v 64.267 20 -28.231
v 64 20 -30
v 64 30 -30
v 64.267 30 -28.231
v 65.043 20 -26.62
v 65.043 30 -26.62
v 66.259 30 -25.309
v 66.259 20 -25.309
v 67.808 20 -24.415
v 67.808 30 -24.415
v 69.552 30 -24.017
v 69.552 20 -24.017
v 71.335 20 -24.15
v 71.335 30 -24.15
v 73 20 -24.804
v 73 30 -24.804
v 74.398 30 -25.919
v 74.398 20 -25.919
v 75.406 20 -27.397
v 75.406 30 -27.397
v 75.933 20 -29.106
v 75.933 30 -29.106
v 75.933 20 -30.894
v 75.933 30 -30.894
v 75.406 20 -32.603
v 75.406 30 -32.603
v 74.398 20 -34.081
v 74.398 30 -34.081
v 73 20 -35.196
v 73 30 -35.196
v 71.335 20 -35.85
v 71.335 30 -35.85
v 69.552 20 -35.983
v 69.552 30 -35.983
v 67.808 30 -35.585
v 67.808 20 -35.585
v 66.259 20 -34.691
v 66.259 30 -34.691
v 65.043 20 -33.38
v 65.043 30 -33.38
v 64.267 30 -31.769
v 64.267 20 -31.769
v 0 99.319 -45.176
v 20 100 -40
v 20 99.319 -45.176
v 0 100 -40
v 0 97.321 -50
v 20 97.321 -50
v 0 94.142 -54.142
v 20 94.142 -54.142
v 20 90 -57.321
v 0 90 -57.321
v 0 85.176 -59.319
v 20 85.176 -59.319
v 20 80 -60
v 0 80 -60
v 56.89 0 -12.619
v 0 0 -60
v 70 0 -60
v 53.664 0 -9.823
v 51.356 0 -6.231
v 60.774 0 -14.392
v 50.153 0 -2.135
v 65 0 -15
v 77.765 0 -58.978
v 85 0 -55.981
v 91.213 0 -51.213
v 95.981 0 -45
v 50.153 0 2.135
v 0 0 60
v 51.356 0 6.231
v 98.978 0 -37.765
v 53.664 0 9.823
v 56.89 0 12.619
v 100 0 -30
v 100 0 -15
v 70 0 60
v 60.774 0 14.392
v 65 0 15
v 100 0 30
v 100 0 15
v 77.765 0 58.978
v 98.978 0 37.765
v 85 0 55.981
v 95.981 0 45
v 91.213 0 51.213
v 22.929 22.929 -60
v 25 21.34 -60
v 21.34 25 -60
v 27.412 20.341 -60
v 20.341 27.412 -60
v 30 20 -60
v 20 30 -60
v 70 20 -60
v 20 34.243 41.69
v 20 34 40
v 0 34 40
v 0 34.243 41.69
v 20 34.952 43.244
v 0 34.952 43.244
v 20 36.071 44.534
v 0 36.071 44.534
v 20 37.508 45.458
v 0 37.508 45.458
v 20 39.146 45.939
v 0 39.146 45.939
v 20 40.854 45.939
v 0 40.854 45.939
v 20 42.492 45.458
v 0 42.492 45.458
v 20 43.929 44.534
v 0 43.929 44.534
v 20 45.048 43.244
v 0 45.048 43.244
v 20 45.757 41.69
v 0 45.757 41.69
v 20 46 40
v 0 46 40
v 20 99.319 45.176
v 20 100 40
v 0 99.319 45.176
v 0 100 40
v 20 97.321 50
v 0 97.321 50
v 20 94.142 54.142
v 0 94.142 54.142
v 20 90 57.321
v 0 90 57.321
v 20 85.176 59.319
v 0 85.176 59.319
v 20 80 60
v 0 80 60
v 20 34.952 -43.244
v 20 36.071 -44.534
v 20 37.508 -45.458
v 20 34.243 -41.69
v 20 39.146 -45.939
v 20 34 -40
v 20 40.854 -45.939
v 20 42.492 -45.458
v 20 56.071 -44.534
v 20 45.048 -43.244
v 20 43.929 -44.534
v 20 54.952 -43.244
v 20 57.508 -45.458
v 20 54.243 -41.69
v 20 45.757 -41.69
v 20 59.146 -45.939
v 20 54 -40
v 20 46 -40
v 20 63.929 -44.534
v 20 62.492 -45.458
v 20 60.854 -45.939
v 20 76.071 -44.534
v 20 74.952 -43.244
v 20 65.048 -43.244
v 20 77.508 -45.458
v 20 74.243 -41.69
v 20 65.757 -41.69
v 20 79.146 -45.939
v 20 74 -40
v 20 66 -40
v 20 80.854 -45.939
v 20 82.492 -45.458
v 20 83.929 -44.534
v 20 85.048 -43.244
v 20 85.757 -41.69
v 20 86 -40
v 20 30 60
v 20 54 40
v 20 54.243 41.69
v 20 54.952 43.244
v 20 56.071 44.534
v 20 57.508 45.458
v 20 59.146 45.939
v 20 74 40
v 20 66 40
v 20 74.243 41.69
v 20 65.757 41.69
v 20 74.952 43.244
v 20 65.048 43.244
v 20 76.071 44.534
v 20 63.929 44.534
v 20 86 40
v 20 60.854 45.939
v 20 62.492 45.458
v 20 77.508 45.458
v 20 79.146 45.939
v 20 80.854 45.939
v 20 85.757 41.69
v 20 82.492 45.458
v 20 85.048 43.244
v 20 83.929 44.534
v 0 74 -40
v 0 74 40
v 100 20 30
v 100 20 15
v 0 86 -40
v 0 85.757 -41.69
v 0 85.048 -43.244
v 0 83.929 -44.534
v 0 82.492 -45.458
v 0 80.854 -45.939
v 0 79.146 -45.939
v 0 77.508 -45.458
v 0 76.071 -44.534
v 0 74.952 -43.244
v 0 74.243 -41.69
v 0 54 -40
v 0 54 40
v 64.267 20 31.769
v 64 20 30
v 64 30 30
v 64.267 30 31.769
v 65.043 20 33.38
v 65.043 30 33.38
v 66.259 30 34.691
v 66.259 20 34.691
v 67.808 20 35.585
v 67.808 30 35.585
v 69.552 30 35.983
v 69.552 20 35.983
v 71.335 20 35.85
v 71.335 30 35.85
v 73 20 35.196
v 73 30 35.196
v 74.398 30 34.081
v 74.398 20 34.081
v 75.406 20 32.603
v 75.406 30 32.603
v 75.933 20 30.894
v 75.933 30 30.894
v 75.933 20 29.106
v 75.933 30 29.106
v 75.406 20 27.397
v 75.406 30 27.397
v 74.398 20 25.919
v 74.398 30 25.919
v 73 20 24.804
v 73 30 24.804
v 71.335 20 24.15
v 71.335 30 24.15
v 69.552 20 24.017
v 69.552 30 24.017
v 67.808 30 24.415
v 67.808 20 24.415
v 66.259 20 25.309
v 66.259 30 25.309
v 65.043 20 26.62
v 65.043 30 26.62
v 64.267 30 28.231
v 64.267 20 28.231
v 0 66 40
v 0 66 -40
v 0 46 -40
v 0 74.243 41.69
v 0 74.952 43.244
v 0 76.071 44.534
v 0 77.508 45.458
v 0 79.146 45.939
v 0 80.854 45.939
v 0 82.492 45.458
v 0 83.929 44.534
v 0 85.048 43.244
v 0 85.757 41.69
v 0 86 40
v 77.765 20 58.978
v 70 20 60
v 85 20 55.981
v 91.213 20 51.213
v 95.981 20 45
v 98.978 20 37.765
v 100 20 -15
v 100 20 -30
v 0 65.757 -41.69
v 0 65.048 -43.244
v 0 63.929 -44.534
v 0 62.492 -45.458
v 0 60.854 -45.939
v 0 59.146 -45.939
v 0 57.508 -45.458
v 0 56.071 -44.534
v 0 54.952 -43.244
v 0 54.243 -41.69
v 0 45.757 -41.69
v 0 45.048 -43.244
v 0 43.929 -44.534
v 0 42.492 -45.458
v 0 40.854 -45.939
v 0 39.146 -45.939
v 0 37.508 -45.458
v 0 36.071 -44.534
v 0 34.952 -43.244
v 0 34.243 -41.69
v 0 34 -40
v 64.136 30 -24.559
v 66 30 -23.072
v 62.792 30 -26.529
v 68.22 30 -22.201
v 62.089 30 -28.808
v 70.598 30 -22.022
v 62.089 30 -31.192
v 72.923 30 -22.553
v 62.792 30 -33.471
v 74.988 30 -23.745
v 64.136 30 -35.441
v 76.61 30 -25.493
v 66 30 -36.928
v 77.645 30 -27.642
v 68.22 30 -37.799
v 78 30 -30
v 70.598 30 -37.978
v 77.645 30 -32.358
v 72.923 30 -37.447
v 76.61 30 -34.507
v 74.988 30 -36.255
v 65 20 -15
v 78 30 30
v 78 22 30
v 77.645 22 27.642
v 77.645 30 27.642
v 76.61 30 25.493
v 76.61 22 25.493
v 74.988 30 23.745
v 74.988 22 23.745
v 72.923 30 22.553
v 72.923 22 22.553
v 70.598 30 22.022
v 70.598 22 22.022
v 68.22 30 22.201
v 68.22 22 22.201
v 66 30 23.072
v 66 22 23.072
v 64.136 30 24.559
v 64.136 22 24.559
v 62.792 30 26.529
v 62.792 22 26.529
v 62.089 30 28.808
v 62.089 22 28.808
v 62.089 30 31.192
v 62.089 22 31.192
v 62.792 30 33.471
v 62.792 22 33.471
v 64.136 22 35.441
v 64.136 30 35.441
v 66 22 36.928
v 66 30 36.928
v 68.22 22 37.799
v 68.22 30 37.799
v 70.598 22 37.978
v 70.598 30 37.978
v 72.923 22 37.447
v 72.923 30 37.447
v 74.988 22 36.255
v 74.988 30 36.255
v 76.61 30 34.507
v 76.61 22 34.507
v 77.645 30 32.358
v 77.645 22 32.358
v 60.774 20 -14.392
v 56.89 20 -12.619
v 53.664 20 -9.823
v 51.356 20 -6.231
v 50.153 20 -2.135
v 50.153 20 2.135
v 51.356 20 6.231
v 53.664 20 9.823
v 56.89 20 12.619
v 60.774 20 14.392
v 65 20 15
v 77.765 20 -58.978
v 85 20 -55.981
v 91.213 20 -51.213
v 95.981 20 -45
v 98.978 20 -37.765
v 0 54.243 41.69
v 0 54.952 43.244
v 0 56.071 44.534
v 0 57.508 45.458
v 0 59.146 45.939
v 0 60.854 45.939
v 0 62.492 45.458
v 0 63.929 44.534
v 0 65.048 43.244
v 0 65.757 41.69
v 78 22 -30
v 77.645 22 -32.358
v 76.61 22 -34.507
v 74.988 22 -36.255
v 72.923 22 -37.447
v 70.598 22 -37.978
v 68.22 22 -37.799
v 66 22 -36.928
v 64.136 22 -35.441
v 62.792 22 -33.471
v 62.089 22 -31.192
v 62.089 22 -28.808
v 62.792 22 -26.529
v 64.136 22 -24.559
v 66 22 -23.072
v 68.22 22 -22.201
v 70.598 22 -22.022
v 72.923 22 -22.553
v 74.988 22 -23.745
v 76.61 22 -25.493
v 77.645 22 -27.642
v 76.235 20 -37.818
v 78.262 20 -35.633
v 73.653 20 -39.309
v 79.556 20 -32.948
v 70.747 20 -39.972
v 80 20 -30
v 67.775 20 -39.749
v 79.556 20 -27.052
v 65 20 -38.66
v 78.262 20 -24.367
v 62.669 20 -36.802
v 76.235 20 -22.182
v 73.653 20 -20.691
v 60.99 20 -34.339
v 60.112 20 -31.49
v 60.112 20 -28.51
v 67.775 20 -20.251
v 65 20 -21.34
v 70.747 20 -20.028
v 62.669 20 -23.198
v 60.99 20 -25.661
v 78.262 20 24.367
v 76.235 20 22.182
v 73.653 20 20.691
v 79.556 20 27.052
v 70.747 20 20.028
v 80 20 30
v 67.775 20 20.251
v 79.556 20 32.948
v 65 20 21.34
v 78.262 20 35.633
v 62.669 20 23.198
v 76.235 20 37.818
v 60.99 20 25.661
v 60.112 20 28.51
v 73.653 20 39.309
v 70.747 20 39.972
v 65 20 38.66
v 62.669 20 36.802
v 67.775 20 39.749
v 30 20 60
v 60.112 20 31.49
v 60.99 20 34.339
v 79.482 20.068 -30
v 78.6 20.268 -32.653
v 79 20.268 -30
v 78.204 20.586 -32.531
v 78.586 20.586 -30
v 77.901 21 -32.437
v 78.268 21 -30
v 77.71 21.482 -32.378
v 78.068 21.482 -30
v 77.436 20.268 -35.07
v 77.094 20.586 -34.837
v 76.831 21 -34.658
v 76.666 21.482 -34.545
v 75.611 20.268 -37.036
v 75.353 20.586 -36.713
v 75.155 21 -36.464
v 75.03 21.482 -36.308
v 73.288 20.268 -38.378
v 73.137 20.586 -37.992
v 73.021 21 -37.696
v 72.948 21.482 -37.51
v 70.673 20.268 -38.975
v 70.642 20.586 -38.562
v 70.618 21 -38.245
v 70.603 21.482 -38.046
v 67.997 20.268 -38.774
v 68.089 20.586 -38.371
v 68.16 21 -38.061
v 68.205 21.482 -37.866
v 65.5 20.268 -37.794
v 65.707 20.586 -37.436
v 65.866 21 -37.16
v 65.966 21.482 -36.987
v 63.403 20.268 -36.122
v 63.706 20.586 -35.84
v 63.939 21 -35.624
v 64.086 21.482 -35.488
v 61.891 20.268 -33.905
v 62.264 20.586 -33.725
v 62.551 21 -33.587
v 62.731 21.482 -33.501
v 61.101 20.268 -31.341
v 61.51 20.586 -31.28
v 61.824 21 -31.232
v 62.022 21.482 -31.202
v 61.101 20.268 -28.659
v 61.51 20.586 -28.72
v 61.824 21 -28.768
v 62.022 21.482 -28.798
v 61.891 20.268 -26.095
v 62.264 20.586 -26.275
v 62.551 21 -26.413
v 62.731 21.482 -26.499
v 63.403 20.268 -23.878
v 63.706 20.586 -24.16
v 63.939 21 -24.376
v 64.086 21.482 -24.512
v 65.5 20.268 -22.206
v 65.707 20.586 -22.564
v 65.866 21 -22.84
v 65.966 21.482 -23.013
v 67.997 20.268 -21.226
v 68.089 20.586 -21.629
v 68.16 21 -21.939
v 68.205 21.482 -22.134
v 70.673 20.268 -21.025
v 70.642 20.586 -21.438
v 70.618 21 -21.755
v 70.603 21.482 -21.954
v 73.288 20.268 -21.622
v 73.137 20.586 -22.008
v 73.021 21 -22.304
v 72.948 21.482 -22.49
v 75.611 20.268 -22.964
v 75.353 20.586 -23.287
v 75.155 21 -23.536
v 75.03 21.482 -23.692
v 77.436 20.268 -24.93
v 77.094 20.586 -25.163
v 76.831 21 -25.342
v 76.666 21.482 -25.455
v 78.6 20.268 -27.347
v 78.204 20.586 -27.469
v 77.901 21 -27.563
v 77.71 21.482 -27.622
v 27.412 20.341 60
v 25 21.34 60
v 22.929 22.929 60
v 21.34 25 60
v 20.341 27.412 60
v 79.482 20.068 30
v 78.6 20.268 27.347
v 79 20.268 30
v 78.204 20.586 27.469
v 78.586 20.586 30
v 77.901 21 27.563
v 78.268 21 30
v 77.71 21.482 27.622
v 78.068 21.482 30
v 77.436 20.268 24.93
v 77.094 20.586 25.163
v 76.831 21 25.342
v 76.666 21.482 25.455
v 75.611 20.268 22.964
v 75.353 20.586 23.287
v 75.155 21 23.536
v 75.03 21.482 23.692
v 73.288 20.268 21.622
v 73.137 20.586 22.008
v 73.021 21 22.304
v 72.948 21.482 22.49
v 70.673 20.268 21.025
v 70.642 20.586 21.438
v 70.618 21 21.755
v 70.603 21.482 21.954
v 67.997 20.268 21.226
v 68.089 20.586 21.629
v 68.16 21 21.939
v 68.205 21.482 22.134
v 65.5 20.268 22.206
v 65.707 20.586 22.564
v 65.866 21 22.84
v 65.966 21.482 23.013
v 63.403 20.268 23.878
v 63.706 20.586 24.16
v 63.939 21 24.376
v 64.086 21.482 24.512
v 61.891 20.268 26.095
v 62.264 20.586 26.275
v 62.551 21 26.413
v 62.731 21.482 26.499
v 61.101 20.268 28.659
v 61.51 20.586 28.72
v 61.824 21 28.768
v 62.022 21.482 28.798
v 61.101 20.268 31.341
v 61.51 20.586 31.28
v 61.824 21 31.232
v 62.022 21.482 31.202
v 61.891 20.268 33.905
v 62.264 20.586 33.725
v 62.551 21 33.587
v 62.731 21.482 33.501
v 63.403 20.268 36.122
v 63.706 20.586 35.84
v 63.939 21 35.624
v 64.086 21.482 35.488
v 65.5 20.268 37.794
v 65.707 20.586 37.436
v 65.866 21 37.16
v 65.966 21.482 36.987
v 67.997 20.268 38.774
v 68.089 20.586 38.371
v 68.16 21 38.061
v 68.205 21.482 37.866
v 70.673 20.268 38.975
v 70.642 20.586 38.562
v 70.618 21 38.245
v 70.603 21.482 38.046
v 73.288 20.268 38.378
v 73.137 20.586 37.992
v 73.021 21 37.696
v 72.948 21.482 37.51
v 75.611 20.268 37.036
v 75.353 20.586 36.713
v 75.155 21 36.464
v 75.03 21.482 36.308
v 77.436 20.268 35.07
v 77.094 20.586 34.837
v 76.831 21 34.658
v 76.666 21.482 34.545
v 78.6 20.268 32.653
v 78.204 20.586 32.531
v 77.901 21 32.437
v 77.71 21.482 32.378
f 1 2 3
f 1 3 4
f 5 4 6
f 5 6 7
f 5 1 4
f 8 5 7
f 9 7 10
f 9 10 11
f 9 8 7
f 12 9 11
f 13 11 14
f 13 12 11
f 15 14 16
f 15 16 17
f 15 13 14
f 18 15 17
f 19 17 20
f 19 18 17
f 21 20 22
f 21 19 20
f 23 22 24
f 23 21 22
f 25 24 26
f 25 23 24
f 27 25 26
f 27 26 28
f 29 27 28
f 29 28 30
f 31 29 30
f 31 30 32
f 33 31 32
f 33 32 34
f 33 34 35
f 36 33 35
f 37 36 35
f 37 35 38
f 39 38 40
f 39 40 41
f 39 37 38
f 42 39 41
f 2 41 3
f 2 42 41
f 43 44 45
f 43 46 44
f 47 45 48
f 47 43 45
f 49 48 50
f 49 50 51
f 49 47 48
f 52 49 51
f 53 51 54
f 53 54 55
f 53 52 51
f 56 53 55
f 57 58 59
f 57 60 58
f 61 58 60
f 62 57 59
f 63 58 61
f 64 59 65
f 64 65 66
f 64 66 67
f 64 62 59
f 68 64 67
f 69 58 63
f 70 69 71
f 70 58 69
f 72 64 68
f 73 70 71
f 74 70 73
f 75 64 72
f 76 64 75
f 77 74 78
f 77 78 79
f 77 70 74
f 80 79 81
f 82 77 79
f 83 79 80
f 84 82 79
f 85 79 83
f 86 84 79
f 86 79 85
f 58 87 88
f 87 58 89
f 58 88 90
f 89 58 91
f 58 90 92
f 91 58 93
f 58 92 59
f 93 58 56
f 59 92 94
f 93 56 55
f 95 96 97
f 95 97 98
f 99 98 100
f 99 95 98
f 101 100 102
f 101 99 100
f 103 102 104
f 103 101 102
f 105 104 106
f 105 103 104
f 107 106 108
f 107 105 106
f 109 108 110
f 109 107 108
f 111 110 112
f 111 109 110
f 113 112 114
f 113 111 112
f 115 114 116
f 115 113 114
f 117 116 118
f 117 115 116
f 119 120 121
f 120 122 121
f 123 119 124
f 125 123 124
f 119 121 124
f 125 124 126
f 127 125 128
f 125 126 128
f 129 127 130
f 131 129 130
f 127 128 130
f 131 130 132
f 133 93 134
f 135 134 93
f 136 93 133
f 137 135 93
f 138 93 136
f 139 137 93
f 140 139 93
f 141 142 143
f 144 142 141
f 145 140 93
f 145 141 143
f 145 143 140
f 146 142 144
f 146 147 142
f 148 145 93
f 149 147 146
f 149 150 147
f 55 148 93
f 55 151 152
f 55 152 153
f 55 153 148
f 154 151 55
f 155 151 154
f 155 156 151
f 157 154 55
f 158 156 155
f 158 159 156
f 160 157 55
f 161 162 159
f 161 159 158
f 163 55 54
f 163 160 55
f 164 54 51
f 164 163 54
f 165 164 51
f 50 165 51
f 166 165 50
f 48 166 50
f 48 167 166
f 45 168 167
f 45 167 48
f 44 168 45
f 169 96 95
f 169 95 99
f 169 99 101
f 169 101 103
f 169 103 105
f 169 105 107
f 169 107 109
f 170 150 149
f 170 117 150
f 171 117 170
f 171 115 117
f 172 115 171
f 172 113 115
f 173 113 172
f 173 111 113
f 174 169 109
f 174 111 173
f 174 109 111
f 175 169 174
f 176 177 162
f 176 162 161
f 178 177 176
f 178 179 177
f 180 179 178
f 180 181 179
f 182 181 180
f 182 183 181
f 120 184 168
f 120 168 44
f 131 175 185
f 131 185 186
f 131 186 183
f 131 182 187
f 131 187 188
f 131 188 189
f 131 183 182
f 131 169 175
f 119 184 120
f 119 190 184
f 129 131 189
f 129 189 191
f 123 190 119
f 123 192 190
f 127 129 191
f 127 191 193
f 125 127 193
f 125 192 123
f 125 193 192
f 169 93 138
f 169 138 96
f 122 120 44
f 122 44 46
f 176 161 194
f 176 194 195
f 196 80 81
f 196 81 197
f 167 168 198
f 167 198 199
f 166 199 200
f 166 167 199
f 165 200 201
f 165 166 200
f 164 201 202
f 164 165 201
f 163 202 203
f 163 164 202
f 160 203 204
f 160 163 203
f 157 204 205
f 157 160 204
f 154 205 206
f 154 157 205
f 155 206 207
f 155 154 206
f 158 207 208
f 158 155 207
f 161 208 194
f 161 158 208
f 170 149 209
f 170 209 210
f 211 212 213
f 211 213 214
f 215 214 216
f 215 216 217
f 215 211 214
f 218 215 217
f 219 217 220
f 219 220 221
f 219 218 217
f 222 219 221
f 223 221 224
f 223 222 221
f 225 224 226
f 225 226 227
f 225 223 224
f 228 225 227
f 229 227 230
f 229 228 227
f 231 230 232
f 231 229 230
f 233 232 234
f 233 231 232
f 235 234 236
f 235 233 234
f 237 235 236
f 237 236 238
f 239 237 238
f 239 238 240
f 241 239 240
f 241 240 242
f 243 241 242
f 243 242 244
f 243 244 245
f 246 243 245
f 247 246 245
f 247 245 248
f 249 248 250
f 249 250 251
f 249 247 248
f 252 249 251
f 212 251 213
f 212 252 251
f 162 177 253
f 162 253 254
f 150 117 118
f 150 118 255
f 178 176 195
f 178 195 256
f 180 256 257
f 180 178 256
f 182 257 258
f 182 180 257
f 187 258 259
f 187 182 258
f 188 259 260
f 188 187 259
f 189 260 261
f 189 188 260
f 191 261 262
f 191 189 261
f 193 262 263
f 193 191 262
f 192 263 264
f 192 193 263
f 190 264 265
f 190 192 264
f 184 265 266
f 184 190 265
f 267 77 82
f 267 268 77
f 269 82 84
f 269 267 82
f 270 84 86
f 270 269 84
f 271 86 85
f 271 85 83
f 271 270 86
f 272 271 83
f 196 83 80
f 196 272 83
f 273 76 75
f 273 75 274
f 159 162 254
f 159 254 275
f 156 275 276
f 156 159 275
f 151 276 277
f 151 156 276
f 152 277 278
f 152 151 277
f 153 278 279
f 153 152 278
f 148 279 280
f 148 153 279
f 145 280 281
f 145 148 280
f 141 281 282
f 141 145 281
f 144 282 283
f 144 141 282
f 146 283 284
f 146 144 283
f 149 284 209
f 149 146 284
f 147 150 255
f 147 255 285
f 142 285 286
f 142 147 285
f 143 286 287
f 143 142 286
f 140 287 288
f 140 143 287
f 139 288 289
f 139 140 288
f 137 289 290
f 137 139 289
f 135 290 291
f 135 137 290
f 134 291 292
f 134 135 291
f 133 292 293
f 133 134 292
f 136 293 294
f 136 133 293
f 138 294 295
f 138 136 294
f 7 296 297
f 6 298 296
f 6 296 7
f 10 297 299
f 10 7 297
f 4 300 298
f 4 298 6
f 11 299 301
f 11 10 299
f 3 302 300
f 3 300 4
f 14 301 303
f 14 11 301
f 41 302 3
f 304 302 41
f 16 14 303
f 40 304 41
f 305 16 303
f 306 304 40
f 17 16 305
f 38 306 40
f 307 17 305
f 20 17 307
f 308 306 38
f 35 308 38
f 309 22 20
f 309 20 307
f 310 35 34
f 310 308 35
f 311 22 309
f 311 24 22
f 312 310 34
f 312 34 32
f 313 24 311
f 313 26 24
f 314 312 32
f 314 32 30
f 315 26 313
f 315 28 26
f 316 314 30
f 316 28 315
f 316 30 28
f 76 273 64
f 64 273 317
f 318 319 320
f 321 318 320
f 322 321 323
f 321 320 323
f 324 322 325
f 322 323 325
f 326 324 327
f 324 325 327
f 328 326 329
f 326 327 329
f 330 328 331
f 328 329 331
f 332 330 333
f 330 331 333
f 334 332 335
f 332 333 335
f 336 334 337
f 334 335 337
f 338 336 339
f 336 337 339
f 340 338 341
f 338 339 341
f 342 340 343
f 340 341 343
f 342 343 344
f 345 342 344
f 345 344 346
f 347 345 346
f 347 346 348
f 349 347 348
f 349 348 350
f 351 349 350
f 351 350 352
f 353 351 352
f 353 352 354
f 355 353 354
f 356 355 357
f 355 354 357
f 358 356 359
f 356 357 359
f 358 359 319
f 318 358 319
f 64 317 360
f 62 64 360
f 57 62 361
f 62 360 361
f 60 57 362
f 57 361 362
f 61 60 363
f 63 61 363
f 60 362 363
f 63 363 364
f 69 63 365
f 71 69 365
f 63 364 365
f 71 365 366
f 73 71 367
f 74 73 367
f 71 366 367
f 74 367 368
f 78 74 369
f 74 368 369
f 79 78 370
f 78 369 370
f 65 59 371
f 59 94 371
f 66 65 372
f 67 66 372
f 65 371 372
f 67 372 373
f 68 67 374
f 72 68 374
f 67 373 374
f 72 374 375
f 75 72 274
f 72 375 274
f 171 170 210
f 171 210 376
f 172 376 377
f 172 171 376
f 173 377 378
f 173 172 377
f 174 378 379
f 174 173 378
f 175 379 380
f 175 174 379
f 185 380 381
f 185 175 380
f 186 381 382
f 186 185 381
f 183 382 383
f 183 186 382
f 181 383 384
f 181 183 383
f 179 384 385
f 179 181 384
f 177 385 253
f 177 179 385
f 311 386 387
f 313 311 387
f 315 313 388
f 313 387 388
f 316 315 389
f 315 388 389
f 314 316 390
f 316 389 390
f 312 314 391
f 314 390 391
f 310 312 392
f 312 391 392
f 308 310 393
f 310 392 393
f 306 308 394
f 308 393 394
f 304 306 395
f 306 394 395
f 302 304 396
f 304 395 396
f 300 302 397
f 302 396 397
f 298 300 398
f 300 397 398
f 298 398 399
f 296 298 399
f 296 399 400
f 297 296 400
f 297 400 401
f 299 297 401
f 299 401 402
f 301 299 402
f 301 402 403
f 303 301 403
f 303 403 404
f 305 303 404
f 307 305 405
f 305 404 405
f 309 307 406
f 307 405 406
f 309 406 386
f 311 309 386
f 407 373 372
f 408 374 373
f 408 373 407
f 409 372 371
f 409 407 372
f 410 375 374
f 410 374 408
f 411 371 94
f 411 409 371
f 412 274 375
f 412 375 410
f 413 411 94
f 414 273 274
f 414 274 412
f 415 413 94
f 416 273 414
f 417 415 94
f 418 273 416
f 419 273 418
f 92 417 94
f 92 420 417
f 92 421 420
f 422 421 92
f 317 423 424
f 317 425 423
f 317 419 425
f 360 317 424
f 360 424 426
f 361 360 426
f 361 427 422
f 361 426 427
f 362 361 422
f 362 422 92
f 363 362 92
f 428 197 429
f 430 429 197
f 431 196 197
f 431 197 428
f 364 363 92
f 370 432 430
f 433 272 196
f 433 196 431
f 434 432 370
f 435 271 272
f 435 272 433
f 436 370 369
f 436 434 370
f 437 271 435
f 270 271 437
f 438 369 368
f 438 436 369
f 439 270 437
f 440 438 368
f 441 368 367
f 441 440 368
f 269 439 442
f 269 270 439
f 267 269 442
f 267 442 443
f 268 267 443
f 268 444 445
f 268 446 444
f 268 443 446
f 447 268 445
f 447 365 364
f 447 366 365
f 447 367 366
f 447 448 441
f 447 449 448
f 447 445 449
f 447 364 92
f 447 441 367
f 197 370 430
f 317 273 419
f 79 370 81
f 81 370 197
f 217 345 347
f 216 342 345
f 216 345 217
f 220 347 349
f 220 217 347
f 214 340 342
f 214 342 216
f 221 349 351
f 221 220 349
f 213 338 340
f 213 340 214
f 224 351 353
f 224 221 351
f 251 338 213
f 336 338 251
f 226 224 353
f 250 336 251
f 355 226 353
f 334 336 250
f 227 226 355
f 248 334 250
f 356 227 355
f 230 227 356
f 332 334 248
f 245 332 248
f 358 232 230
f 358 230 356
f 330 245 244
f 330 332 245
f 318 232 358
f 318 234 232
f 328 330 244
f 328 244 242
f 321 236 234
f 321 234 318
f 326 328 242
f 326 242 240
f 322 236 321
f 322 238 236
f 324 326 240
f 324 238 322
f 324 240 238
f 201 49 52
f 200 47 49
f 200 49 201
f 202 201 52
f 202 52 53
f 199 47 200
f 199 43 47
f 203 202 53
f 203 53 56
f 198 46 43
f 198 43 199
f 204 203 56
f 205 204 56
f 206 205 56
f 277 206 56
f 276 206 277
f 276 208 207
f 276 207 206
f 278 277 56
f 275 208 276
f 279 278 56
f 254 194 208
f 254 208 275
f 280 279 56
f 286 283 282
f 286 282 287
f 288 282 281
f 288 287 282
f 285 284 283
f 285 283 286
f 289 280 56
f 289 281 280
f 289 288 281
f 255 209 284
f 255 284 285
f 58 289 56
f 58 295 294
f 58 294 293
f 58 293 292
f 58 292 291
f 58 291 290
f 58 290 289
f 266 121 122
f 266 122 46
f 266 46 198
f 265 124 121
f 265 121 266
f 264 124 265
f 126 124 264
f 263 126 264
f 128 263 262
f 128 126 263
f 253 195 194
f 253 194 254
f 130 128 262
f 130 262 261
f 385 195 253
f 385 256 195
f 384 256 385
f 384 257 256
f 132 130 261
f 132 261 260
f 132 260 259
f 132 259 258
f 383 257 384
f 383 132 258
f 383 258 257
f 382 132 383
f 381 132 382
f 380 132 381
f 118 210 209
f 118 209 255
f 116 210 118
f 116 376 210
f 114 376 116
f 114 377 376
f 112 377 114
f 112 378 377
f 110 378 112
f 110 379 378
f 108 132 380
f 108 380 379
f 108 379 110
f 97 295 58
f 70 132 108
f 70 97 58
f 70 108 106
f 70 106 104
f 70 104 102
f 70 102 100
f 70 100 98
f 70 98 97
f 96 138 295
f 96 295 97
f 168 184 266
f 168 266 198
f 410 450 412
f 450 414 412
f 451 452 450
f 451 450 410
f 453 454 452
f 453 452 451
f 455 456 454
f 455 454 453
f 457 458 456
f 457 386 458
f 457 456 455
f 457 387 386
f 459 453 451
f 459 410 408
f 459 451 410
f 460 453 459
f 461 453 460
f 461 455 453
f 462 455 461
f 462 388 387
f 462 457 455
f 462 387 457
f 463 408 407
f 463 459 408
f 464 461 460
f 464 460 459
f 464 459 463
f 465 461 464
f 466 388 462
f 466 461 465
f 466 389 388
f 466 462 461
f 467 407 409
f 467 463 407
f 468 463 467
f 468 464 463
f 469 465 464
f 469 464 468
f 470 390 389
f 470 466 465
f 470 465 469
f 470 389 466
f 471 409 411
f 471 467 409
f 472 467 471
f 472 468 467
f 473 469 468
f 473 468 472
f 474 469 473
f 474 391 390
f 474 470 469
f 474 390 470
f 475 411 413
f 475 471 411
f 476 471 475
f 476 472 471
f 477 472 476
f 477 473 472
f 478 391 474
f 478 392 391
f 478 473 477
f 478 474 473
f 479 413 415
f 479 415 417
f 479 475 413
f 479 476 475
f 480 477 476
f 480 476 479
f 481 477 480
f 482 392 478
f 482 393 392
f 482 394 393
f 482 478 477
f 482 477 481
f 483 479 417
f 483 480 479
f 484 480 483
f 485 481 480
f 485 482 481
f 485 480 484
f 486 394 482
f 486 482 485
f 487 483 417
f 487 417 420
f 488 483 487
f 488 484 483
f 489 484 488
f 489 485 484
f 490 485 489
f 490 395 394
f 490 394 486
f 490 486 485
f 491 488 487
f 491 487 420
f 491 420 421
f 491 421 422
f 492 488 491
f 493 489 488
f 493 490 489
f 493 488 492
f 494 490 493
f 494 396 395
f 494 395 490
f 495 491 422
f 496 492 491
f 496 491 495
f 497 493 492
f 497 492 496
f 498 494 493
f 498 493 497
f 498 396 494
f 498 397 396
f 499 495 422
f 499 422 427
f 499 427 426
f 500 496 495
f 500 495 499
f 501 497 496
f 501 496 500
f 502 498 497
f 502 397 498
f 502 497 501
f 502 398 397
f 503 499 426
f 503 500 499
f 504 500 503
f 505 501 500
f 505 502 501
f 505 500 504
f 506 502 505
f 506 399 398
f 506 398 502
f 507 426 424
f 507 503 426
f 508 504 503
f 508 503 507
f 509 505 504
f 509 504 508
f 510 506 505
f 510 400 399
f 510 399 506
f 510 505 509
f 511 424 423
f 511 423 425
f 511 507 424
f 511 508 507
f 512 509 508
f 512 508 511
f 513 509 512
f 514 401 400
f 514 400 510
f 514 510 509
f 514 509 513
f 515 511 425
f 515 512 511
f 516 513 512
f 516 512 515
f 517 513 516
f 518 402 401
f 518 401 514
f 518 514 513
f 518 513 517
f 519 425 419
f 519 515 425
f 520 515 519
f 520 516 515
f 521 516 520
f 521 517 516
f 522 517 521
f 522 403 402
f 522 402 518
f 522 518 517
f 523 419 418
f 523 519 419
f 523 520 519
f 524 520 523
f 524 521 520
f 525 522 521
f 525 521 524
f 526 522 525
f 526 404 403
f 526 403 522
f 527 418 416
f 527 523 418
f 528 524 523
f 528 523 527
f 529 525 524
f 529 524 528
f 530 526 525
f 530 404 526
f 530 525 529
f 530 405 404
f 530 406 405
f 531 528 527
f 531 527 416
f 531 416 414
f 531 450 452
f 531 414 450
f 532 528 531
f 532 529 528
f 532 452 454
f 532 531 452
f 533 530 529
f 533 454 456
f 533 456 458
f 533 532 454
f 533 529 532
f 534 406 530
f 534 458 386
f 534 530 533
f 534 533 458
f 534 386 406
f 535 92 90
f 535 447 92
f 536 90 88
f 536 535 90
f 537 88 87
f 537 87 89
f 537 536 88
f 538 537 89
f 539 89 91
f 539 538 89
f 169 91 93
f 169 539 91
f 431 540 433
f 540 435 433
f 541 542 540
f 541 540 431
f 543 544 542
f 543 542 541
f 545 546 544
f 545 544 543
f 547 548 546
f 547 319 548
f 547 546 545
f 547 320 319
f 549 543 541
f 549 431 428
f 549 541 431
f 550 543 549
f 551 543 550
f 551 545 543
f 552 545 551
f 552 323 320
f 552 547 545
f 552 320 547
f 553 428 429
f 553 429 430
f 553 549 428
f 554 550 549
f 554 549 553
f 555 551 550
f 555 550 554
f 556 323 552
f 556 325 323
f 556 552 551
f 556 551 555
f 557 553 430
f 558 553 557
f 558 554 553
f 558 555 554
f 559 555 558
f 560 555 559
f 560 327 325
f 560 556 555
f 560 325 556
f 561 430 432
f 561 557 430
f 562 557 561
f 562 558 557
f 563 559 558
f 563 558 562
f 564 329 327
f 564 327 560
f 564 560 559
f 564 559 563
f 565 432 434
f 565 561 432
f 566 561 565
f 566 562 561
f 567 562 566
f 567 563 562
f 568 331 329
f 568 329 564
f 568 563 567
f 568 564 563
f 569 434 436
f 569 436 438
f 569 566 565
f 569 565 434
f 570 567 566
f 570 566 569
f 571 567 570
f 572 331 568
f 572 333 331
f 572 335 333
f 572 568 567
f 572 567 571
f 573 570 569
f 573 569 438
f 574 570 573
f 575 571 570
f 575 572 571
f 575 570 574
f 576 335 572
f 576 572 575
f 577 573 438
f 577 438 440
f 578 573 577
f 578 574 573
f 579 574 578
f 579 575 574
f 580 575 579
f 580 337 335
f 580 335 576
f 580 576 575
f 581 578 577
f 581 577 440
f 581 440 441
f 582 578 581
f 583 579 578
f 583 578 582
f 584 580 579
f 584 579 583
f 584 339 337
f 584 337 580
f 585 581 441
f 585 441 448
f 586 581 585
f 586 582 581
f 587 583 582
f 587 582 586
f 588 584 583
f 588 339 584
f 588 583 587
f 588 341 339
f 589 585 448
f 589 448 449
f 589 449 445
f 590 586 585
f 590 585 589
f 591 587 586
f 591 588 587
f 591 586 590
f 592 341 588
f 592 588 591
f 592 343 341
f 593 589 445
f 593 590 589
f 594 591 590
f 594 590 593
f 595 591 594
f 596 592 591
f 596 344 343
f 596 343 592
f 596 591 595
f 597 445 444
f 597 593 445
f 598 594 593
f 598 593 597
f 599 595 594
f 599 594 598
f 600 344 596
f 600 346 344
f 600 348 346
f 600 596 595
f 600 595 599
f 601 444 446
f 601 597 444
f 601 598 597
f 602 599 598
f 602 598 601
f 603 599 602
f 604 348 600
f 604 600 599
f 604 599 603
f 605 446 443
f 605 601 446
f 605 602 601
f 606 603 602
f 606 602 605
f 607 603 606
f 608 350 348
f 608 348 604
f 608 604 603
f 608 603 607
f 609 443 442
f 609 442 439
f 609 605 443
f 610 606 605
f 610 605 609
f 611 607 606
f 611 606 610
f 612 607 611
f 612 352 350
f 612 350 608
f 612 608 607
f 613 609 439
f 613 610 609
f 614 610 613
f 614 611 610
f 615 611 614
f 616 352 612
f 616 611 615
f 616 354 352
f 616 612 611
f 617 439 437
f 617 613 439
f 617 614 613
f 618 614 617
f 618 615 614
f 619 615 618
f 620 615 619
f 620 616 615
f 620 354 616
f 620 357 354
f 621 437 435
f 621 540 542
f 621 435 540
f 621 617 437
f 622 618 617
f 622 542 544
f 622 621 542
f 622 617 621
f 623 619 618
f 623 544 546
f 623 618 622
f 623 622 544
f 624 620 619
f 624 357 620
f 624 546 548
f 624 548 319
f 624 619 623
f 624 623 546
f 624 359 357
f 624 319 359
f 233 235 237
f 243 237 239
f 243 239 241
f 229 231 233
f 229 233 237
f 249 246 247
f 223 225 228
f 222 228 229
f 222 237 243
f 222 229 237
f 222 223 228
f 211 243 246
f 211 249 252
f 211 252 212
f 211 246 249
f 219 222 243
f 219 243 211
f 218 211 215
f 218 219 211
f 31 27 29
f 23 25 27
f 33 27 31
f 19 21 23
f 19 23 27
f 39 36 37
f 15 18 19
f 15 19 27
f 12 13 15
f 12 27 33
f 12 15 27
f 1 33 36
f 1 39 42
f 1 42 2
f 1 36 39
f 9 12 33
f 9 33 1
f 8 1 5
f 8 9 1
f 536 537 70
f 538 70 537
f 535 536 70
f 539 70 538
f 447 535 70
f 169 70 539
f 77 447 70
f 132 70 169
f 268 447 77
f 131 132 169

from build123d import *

# Parameters (mm, degrees)
BOSS_EXTRUDE1_DEPTH = 60
FILLET1_R           = 20
FILLET2_R           = 30
FILLET3_R           = 10
CUT_EXTRUDE1_REACH  = 143.421
CUT_EXTRUDE2_REACH  = 143.421
SKETCH3_3_R         = 8
SKETCH3_3_R_2       = 6
BOSS_EXTRUDE2_DEPTH = 10
FILLET4_R           = 2


with BuildPart() as part:
    # Sketch1 → Boss-Extrude1 (new, symmetric)
    with BuildSketch(Plane.XY):
        Polygon((0, 0), (100, 0), (100, 20), (20, 20), (20, 100), (0, 100), align=None)
    extrude(amount=BOSS_EXTRUDE1_DEPTH, both=True)

    # Fillet1
    fillet1_edges = [part.edges().sort_by_distance(p)[0] for p in [
        (10, 100, -60),
        (10, 100, 60),
    ]]
    fillet(fillet1_edges, radius=FILLET1_R)

    # Fillet2
    fillet2_edges = [part.edges().sort_by_distance(p)[0] for p in [
        (100, 10, -60),
        (100, 10, 60),
    ]]
    fillet(fillet2_edges, radius=FILLET2_R)

    # Fillet3
    fillet3_edges = [part.edges().sort_by_distance(p)[0] for p in [
        (20, 20, 0),
    ]]
    fillet(fillet3_edges, radius=FILLET3_R)

    # Sketch2 → Cut-Extrude1 (cut, up to next)
    with BuildSketch(Plane(origin=(20, 0, 0), x_dir=(0, 0, -1), z_dir=(1, 0, 0)), mode=Mode.PRIVATE) as cut_extrude1_sk1:
        with BuildLine():
            Line((-40, 86), (40, 86))
            ThreePointArc((40, 86), (46, 80), (40, 74))
            Line((40, 74), (-40, 74))
            ThreePointArc((-40, 74), (-46, 80), (-40, 86))
        make_face()
    cut_extrude1_tool1 = extrude(cut_extrude1_sk1.sketch, amount=-CUT_EXTRUDE1_REACH, mode=Mode.PRIVATE) & part.part
    # Sketch2 → Cut-Extrude1 (cut, up to next)
    with BuildSketch(Plane(origin=(20, 0, 0), x_dir=(0, 0, -1), z_dir=(1, 0, 0)), mode=Mode.PRIVATE) as cut_extrude1_sk2:
        with BuildLine():
            Line((-40, 66), (40, 66))
            ThreePointArc((40, 66), (46, 60), (40, 54))
            Line((40, 54), (-40, 54))
            ThreePointArc((-40, 54), (-46, 60), (-40, 66))
        make_face()
    cut_extrude1_tool2 = extrude(cut_extrude1_sk2.sketch, amount=-CUT_EXTRUDE1_REACH, mode=Mode.PRIVATE) & part.part
    # Sketch2 → Cut-Extrude1 (cut, up to next)
    with BuildSketch(Plane(origin=(20, 0, 0), x_dir=(0, 0, -1), z_dir=(1, 0, 0)), mode=Mode.PRIVATE) as cut_extrude1_sk3:
        with BuildLine():
            Line((-40, 46), (40, 46))
            ThreePointArc((40, 46), (46, 40), (40, 34))
            Line((40, 34), (-40, 34))
            ThreePointArc((-40, 34), (-46, 40), (-40, 46))
        make_face()
    cut_extrude1_tool3 = extrude(cut_extrude1_sk3.sketch, amount=-CUT_EXTRUDE1_REACH, mode=Mode.PRIVATE) & part.part
    add(cut_extrude1_tool1.solids().sort_by_distance((20, 80, 0))[0], mode=Mode.SUBTRACT)
    add(cut_extrude1_tool2.solids().sort_by_distance((20, 60, 0))[0], mode=Mode.SUBTRACT)
    add(cut_extrude1_tool3.solids().sort_by_distance((20, 40, 0))[0], mode=Mode.SUBTRACT)

    # Sketch3 → Cut-Extrude2 (cut, up to next)
    with BuildSketch(Plane(origin=(0, 20, 0), x_dir=(1, 0, 0), z_dir=(0, 1, 0)), mode=Mode.PRIVATE) as cut_extrude2_sk1:
        with BuildLine():
            Line((65, -15), (100, -15))
            Line((100, -15), (100, 15))
            Line((100, 15), (65, 15))
            ThreePointArc((65, 15), (50, 0), (65, -15))
        make_face()
    cut_extrude2_tool1 = extrude(cut_extrude2_sk1.sketch, amount=-CUT_EXTRUDE2_REACH, mode=Mode.PRIVATE) & part.part
    add(cut_extrude2_tool1.solids().sort_by_distance((76.489714, 20, 0))[0], mode=Mode.SUBTRACT)

    # Sketch3<3> → Boss-Extrude2 (add)
    # profile 1 of 2: a face of its own
    with BuildSketch(Plane(origin=(0, 20, 0), x_dir=(1, 0, 0), z_dir=(0, 1, 0))):
        with Locations((70, 30)):
            Circle(SKETCH3_3_R)
        with Locations((70, 30)):
            Circle(SKETCH3_3_R_2, mode=Mode.SUBTRACT)
    # profile 2 of 2: a face of its own
    with BuildSketch(Plane(origin=(0, 20, 0), x_dir=(1, 0, 0), z_dir=(0, 1, 0))):
        with Locations((70, -30)):
            Circle(SKETCH3_3_R)
        with Locations((70, -30)):
            Circle(SKETCH3_3_R_2, mode=Mode.SUBTRACT)
    extrude(amount=BOSS_EXTRUDE2_DEPTH)

    # Fillet4
    fillet4_edges = [part.edges().sort_by_distance(p)[0] for p in [
        (62, 20, 30),
        (62, 20, -30),
    ]]
    fillet(fillet4_edges, radius=FILLET4_R)


solid = part.part
